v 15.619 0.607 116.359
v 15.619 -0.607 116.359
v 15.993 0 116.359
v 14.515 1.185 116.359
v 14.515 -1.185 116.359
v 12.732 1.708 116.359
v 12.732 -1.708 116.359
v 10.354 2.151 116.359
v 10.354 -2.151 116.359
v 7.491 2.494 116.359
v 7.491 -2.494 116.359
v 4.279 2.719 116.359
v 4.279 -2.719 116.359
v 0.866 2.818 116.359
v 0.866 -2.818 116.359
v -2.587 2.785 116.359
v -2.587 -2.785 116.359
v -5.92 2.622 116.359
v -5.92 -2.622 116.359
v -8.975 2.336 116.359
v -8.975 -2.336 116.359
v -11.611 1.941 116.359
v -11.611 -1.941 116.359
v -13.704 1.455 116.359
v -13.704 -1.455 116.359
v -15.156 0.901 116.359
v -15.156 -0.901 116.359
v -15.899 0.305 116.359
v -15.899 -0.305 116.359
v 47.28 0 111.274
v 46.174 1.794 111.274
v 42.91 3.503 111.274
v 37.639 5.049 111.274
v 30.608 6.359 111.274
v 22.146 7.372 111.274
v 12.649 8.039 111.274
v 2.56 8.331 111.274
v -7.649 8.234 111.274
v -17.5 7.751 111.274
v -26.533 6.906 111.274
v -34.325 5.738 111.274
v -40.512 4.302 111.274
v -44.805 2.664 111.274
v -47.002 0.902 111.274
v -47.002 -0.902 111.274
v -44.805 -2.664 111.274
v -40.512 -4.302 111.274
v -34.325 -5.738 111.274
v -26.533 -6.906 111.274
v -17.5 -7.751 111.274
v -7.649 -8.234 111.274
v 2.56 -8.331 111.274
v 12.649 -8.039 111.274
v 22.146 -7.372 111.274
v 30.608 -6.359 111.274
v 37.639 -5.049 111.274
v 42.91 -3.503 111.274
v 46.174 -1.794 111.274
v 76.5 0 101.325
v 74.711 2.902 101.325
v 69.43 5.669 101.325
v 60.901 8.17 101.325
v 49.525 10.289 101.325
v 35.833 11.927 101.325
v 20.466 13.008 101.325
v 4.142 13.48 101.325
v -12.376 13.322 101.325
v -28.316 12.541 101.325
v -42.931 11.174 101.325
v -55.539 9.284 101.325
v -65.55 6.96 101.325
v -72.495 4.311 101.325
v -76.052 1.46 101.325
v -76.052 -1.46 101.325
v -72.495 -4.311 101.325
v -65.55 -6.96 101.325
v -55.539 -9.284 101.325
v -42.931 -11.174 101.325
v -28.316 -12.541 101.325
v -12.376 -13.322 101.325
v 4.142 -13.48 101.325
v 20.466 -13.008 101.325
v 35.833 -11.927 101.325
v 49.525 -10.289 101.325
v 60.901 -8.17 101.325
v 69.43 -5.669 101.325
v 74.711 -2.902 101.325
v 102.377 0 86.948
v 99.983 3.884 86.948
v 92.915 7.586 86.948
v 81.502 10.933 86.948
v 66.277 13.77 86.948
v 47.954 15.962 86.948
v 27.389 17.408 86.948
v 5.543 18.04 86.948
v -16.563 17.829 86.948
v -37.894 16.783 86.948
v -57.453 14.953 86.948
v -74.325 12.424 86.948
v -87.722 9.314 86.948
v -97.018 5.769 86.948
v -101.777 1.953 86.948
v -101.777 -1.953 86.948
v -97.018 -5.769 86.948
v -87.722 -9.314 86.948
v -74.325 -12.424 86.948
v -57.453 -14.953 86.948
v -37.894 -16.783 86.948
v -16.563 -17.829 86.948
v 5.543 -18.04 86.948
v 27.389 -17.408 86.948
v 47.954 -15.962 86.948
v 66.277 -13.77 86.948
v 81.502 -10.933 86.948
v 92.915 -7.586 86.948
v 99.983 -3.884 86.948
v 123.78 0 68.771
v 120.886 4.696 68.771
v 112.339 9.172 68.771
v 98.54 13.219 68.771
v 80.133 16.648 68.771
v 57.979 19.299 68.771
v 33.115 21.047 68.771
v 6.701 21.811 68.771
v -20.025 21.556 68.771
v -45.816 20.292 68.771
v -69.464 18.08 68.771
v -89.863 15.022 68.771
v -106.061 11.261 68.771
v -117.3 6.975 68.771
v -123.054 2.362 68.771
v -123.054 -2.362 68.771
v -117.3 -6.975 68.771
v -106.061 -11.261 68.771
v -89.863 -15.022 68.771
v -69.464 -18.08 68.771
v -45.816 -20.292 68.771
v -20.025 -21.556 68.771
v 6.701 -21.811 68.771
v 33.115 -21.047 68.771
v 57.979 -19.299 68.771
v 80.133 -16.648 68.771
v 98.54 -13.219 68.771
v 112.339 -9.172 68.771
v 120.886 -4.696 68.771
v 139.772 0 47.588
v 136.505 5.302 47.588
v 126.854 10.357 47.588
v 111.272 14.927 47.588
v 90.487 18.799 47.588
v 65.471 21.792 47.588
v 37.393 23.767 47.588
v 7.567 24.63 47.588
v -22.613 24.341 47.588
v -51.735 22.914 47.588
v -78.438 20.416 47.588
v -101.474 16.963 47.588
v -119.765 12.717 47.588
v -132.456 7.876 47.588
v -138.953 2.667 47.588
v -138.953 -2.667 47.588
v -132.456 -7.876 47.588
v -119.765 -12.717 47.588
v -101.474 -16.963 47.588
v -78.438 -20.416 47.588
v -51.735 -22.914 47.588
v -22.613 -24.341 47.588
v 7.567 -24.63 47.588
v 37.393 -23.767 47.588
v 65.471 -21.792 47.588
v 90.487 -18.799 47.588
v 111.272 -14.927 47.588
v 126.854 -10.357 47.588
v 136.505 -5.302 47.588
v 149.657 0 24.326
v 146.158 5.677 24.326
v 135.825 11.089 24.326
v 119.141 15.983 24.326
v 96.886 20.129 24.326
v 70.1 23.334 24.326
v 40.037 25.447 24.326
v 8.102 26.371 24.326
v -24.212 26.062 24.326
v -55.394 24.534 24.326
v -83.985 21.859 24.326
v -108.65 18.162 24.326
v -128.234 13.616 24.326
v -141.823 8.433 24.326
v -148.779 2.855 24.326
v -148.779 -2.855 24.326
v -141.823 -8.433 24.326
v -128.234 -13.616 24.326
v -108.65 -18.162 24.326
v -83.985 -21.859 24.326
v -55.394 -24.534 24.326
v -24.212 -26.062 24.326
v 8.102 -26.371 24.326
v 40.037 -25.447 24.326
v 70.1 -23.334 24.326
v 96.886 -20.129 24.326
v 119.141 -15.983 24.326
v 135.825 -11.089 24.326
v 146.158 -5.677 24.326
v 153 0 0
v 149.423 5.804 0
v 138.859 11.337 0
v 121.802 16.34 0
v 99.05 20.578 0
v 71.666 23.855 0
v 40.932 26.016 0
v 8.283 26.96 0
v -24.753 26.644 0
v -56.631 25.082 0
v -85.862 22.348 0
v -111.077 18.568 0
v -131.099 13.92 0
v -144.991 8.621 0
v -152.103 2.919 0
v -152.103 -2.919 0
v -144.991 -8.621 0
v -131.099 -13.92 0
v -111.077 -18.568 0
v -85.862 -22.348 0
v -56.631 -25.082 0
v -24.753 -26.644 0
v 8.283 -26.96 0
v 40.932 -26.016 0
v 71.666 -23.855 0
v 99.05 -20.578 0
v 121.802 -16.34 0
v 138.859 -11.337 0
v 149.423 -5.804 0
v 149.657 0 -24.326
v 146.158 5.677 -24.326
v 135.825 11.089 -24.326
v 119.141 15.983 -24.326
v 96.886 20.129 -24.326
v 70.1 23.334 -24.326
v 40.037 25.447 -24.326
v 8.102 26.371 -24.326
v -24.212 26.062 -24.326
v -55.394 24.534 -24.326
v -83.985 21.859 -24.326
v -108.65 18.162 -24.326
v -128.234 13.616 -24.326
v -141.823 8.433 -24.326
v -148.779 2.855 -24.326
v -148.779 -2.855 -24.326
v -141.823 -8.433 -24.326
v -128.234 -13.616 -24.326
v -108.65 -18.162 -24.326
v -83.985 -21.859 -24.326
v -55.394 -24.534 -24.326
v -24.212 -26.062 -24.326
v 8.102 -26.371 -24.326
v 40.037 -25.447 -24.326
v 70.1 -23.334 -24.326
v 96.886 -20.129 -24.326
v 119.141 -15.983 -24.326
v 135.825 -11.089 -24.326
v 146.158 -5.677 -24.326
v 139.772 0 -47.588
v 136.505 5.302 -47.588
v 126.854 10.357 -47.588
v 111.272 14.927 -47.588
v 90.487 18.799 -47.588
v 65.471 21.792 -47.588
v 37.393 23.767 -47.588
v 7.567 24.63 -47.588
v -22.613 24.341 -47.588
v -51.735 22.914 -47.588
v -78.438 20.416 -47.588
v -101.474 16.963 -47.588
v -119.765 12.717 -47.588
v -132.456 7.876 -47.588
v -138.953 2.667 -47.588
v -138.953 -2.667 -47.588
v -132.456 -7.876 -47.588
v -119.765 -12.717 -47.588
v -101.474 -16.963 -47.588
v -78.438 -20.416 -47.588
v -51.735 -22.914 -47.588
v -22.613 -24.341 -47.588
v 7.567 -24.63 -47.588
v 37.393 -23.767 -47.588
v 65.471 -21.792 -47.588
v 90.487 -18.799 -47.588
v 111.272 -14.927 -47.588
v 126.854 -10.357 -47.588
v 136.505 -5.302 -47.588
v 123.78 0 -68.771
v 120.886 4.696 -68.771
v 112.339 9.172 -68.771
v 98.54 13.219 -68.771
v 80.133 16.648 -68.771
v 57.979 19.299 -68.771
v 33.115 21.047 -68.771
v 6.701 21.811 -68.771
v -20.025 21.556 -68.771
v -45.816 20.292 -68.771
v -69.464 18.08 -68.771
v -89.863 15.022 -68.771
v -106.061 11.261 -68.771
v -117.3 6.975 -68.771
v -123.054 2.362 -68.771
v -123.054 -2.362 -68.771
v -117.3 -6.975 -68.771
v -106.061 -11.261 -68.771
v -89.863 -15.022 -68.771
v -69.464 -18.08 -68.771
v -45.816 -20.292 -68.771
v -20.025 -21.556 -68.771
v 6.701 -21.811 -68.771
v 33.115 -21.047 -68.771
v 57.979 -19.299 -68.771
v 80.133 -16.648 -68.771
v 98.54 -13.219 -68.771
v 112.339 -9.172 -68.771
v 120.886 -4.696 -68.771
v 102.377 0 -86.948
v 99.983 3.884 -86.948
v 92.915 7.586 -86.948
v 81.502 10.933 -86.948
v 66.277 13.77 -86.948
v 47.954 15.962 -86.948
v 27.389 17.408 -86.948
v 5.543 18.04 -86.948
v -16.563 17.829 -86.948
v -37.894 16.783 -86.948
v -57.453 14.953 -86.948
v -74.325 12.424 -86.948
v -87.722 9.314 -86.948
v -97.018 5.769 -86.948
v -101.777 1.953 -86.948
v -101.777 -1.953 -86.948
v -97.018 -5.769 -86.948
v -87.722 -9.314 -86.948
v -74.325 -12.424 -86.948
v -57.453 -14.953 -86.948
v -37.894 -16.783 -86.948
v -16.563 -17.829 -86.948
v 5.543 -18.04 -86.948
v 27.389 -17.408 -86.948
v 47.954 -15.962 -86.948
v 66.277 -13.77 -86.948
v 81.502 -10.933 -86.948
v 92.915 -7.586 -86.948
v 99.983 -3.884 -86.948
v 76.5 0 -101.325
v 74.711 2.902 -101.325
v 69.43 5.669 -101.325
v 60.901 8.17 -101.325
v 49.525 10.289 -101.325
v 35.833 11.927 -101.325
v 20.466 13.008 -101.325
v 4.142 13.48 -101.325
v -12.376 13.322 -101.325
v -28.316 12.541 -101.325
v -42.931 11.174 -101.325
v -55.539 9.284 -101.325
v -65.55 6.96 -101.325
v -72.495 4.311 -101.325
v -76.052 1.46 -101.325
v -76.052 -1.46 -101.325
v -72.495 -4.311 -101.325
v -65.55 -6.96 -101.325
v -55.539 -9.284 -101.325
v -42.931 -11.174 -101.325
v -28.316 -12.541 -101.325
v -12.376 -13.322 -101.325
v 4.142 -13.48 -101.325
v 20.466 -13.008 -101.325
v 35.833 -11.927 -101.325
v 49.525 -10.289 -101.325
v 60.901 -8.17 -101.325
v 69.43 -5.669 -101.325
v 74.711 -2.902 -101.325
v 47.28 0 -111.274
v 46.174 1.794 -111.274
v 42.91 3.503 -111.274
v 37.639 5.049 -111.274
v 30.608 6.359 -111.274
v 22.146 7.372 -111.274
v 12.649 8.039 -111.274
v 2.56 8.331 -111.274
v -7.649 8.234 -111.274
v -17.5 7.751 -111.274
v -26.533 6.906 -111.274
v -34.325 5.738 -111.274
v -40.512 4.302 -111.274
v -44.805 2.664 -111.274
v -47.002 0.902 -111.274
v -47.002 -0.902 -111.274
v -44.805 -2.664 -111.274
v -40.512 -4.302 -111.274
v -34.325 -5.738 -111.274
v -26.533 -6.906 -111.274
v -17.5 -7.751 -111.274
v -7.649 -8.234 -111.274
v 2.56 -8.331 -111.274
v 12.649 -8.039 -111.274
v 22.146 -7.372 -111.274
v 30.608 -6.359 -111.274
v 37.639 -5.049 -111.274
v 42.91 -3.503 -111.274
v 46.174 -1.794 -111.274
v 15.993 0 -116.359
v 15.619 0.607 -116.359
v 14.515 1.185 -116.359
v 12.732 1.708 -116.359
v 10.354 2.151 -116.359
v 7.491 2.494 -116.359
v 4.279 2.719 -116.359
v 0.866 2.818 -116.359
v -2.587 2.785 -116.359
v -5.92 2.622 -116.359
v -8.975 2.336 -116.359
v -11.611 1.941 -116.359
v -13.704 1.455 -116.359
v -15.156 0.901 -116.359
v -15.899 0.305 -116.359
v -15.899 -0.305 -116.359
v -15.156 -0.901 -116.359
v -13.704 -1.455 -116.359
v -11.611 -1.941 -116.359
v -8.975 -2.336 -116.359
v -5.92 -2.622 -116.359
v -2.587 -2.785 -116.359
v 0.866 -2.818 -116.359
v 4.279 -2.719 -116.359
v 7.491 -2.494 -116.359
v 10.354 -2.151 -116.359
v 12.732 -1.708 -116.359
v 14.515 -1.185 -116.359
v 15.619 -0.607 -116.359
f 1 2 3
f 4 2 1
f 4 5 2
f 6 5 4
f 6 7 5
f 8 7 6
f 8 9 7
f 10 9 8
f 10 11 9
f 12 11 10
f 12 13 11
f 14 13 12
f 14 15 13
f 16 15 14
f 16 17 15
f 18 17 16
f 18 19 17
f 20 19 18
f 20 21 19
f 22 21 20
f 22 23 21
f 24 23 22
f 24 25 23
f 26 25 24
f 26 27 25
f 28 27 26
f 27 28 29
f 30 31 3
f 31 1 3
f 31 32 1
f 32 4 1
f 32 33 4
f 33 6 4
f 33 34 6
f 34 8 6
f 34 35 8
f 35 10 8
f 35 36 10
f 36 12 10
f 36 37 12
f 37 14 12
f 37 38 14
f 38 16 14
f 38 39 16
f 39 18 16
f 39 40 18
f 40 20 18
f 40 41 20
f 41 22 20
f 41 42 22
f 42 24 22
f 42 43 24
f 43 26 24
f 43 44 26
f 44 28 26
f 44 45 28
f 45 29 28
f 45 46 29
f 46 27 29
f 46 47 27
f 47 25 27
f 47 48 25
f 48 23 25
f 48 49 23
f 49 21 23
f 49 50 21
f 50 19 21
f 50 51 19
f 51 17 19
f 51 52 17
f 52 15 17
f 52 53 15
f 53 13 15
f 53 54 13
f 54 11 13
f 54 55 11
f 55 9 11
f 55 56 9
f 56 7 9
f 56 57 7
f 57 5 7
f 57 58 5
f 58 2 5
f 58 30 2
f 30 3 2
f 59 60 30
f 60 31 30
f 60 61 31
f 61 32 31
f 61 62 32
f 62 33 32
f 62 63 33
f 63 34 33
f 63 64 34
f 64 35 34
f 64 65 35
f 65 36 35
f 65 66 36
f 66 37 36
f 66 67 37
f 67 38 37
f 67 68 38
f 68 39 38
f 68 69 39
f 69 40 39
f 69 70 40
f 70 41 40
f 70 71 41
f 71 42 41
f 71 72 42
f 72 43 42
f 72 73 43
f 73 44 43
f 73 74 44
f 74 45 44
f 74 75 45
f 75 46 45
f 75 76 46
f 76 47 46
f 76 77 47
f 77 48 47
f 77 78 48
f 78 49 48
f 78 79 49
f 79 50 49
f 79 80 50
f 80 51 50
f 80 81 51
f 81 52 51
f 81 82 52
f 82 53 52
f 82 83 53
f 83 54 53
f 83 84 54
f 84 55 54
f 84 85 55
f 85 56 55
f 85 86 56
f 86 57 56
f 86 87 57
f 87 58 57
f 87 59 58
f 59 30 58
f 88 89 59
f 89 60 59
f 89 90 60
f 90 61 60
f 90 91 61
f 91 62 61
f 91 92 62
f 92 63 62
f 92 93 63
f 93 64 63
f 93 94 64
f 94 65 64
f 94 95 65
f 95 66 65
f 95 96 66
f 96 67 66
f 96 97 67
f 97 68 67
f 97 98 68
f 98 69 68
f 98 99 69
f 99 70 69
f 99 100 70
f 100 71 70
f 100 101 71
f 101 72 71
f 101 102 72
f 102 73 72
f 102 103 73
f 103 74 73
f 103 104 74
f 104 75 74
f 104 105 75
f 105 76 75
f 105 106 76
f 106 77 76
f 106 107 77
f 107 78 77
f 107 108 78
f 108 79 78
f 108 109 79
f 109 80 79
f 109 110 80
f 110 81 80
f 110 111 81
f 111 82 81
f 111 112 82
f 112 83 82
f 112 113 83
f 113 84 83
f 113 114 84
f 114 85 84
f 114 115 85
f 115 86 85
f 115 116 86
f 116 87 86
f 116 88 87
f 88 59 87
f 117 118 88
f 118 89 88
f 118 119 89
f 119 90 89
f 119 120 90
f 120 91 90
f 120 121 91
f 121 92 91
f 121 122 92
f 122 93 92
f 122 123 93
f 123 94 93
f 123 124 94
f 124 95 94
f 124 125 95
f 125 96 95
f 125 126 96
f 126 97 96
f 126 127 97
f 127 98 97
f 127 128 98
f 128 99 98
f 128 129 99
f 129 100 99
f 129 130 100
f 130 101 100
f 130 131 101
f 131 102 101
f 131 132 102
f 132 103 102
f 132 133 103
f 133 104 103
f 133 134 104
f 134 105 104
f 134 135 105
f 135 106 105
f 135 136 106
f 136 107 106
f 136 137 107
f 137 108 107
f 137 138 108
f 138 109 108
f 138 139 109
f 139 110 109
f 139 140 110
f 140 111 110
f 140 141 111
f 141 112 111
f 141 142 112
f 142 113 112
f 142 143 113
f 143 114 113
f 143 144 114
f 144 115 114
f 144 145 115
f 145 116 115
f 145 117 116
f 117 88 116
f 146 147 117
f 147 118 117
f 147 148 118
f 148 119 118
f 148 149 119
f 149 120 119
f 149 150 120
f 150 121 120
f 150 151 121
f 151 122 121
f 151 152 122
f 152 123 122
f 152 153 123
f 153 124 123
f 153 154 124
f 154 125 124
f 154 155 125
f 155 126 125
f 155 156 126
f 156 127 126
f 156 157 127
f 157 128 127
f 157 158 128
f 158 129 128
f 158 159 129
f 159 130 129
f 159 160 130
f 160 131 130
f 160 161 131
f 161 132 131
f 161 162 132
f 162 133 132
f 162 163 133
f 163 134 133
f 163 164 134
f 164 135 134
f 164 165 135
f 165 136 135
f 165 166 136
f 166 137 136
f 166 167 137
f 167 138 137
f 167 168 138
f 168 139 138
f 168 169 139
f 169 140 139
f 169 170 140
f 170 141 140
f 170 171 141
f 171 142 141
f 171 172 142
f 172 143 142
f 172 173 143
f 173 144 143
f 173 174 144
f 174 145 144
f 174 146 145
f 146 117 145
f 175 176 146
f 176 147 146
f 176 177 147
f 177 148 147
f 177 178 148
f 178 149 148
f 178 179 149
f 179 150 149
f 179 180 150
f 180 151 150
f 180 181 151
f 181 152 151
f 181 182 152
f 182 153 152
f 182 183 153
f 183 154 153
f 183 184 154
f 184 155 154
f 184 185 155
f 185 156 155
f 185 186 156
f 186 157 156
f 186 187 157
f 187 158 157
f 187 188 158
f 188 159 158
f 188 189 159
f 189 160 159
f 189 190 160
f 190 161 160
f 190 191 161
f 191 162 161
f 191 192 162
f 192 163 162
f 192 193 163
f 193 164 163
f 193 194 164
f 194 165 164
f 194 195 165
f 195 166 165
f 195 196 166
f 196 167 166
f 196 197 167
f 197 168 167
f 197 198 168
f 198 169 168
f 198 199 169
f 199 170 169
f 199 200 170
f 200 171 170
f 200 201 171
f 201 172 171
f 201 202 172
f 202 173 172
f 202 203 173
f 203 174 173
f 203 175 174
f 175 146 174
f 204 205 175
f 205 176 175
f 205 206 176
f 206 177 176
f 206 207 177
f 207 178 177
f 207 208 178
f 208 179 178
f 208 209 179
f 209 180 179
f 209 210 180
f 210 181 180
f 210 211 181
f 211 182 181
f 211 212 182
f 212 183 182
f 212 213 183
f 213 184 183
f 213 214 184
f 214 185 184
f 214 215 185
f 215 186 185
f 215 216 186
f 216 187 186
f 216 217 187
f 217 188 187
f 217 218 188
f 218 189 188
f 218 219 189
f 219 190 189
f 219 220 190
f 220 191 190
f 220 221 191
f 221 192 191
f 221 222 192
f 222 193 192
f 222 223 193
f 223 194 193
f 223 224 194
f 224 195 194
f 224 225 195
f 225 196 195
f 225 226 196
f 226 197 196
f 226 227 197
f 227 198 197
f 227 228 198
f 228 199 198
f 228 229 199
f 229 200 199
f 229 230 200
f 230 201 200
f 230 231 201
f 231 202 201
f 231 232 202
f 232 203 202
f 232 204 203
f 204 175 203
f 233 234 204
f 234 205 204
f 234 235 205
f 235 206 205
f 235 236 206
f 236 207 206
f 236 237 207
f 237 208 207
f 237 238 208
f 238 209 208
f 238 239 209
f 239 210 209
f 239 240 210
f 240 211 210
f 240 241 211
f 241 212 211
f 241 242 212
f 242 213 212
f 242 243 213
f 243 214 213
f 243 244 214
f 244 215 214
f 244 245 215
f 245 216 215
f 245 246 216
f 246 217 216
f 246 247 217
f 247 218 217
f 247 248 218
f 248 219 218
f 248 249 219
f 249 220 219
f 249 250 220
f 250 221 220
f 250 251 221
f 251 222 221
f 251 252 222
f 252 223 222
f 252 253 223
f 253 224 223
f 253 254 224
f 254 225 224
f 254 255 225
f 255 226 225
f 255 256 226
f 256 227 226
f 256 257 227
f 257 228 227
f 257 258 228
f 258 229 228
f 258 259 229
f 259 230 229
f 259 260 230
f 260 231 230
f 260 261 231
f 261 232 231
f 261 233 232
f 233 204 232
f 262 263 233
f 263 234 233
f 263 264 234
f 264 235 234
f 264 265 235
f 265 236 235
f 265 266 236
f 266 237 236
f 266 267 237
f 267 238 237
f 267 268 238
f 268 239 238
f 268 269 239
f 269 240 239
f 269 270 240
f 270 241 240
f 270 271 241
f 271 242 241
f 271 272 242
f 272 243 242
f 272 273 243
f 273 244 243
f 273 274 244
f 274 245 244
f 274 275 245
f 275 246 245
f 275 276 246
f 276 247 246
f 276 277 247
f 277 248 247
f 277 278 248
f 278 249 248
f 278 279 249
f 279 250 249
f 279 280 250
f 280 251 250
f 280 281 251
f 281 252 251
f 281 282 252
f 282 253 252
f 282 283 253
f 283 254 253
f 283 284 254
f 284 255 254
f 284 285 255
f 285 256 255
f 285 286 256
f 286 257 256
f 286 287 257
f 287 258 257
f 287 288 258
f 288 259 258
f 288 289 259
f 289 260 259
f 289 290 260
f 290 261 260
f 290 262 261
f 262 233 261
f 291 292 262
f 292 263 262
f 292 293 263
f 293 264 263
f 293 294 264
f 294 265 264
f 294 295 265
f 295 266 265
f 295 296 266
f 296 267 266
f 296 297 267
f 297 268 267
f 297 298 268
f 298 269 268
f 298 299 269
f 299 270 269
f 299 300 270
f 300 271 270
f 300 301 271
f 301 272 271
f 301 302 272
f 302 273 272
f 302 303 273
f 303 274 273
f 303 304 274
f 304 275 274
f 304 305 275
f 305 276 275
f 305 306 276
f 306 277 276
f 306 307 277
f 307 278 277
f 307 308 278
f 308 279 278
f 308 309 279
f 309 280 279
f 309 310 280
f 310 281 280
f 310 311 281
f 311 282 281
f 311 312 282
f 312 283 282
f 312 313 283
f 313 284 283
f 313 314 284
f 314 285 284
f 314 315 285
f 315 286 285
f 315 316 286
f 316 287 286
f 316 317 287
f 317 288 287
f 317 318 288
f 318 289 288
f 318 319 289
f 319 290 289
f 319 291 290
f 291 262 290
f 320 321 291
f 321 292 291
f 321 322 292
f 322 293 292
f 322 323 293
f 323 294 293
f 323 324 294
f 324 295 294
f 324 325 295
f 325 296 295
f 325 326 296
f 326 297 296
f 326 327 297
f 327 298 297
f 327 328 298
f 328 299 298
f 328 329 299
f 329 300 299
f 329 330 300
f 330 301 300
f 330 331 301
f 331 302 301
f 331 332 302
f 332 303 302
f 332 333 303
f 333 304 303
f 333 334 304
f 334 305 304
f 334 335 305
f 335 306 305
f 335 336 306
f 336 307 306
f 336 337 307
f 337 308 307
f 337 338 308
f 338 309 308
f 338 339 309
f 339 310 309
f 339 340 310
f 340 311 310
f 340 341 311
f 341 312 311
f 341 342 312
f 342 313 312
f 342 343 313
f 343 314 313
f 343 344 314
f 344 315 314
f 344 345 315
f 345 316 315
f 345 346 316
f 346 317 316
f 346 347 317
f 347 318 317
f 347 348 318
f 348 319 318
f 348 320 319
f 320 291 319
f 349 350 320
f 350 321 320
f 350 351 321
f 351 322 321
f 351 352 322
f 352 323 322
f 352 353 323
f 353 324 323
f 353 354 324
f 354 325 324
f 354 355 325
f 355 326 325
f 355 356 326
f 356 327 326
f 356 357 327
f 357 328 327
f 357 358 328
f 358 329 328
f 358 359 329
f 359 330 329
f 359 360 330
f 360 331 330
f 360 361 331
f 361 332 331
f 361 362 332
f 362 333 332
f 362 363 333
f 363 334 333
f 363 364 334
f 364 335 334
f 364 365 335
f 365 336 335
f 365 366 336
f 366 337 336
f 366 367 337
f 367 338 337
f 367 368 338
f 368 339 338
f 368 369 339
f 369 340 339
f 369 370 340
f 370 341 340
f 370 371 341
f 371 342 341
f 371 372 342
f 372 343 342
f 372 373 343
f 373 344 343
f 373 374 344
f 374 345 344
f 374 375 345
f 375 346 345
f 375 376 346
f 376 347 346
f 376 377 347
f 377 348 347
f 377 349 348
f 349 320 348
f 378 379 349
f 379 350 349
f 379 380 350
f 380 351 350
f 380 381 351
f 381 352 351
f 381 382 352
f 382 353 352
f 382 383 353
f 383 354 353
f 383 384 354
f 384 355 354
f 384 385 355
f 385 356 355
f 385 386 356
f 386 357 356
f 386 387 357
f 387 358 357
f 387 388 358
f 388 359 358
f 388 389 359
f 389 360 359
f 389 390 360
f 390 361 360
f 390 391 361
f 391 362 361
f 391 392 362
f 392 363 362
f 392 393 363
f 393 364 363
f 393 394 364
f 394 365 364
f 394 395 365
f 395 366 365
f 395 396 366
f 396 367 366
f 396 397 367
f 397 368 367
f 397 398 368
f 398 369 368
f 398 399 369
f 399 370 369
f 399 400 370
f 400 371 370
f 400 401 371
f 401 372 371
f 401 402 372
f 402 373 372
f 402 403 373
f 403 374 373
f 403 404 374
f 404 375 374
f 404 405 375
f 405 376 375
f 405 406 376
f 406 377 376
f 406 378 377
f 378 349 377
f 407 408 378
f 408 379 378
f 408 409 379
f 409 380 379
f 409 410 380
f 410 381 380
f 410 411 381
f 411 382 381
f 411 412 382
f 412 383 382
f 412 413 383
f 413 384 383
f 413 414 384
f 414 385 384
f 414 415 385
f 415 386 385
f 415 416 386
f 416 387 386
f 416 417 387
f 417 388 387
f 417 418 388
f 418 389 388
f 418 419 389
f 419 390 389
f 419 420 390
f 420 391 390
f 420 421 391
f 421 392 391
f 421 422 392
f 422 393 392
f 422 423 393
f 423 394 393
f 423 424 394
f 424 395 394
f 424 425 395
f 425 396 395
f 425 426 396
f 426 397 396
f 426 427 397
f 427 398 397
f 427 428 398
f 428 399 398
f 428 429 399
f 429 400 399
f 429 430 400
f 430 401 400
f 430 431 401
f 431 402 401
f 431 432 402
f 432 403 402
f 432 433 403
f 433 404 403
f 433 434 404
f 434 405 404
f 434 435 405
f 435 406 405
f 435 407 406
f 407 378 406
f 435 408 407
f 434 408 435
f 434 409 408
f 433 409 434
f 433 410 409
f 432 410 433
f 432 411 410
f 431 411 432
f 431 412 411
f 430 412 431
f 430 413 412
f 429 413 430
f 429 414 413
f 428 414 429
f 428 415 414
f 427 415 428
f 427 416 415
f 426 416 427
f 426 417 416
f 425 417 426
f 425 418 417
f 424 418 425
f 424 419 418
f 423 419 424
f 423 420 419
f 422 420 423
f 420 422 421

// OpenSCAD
// Generated by SolidPython 1.0.1 on 2020-07-29 00:46:52


scale(v = [17, 3, 13]) {
	sphere(r = 9);
}
/***********************************************
*********      SolidPython code:      **********
************************************************
 
# import packages: SolidPython
from solid import *
from solid.utils import *
from itertools import chain, combinations, permutations


class Resize:

    def __init__(self, scad_file):
        self.scad_file = scad_file
        #self.scad_file = import_scad(scad_file)
        # cone/cylinder param:
        self.r1 = 0
        self.r2 = 0
        self.h = 0
        # rectangular prism param:
        self.w = 0
        self.l = 0
        # ellipse param:
        self.r = 0

    # import OpenScad code (file name corresponds to shape)


    # classify shape + parameters
    def assign(self, param1, param2, param3):
        if self.scad_file == 'cone.scad':
            self.r1 = param1
            self.r2 = param2
            self.h = param3
        elif self.scad_file == 'cylinder.scad':
            self.r1 = param1
            self.r2 = param2
            self.h = param3
        elif self.scad_file == 'rectangularPrism.scad':
            self.h = param1
            self.l = param2
            self.w = param3
        else:
            self.r = param1
            self.h = param2

    # resize parameters
    def iterate(self):
        x = range(3, 20, 2)
        i = 1
        if self.scad_file == 'cone.scad':
            tempList = list(permutations(x, 2))
            for temp in tempList:
                param1 = temp[0]
                param2 = temp[1]
                filepath = 'produced_scad_files/' + 'cone' + str(param1) + '_' + str(param2) + '_' + '.scad'
                scad_render_to_file(cylinder(h=param1, r1=param2, r2=0), filepath)

        elif self.scad_file == 'cylinder.scad':
            tempList = list(permutations(x, 3))
            for temp in tempList:
                param1 = temp[0]
                param2 = temp[1]
                filepath = 'produced_scad_files/' + 'cylinder' + str(param1) + '_' + str(param2) + '_' + '.scad'
                scad_render_to_file(cylinder(h=param1, r1=param2, r2=param2), filepath)

        elif self.scad_file == 'rectangularPrism.scad':
            tempList = list(permutations(x, 3))
            for temp in tempList:
                param1 = temp[0]
                param2 = temp[1]
                param3 = temp[2]
                filepath = 'produced_scad_files/' + 'rectangularPrism' + str(param1) + '_' + str(param2) + '_' + str(
                    param3) + '.scad'
                scad_render_to_file(cube(size=(param1, param2, param3)), filepath)

        elif self.scad_file == 'ellipse.scad':
            tempList = list(permutations(x, 4))
            for temp in tempList:
                param1 = temp[0]
                param2 = temp[1]
                param3 = temp[2]
                param4 = temp[3]
                filepath = 'produced_scad_files/' + 'ellipse' + str(param1) + '_' + str(param2) + '_' + str(param3) + '_' + str(param4) + '.scad'
                scad_render_to_file(scale([param1, param2, param3])(sphere(r=param4)), filepath)

    def render_to_scadfile(self):
        scad_render_to_file(scad, 'example.scad') 
 
************************************************/
